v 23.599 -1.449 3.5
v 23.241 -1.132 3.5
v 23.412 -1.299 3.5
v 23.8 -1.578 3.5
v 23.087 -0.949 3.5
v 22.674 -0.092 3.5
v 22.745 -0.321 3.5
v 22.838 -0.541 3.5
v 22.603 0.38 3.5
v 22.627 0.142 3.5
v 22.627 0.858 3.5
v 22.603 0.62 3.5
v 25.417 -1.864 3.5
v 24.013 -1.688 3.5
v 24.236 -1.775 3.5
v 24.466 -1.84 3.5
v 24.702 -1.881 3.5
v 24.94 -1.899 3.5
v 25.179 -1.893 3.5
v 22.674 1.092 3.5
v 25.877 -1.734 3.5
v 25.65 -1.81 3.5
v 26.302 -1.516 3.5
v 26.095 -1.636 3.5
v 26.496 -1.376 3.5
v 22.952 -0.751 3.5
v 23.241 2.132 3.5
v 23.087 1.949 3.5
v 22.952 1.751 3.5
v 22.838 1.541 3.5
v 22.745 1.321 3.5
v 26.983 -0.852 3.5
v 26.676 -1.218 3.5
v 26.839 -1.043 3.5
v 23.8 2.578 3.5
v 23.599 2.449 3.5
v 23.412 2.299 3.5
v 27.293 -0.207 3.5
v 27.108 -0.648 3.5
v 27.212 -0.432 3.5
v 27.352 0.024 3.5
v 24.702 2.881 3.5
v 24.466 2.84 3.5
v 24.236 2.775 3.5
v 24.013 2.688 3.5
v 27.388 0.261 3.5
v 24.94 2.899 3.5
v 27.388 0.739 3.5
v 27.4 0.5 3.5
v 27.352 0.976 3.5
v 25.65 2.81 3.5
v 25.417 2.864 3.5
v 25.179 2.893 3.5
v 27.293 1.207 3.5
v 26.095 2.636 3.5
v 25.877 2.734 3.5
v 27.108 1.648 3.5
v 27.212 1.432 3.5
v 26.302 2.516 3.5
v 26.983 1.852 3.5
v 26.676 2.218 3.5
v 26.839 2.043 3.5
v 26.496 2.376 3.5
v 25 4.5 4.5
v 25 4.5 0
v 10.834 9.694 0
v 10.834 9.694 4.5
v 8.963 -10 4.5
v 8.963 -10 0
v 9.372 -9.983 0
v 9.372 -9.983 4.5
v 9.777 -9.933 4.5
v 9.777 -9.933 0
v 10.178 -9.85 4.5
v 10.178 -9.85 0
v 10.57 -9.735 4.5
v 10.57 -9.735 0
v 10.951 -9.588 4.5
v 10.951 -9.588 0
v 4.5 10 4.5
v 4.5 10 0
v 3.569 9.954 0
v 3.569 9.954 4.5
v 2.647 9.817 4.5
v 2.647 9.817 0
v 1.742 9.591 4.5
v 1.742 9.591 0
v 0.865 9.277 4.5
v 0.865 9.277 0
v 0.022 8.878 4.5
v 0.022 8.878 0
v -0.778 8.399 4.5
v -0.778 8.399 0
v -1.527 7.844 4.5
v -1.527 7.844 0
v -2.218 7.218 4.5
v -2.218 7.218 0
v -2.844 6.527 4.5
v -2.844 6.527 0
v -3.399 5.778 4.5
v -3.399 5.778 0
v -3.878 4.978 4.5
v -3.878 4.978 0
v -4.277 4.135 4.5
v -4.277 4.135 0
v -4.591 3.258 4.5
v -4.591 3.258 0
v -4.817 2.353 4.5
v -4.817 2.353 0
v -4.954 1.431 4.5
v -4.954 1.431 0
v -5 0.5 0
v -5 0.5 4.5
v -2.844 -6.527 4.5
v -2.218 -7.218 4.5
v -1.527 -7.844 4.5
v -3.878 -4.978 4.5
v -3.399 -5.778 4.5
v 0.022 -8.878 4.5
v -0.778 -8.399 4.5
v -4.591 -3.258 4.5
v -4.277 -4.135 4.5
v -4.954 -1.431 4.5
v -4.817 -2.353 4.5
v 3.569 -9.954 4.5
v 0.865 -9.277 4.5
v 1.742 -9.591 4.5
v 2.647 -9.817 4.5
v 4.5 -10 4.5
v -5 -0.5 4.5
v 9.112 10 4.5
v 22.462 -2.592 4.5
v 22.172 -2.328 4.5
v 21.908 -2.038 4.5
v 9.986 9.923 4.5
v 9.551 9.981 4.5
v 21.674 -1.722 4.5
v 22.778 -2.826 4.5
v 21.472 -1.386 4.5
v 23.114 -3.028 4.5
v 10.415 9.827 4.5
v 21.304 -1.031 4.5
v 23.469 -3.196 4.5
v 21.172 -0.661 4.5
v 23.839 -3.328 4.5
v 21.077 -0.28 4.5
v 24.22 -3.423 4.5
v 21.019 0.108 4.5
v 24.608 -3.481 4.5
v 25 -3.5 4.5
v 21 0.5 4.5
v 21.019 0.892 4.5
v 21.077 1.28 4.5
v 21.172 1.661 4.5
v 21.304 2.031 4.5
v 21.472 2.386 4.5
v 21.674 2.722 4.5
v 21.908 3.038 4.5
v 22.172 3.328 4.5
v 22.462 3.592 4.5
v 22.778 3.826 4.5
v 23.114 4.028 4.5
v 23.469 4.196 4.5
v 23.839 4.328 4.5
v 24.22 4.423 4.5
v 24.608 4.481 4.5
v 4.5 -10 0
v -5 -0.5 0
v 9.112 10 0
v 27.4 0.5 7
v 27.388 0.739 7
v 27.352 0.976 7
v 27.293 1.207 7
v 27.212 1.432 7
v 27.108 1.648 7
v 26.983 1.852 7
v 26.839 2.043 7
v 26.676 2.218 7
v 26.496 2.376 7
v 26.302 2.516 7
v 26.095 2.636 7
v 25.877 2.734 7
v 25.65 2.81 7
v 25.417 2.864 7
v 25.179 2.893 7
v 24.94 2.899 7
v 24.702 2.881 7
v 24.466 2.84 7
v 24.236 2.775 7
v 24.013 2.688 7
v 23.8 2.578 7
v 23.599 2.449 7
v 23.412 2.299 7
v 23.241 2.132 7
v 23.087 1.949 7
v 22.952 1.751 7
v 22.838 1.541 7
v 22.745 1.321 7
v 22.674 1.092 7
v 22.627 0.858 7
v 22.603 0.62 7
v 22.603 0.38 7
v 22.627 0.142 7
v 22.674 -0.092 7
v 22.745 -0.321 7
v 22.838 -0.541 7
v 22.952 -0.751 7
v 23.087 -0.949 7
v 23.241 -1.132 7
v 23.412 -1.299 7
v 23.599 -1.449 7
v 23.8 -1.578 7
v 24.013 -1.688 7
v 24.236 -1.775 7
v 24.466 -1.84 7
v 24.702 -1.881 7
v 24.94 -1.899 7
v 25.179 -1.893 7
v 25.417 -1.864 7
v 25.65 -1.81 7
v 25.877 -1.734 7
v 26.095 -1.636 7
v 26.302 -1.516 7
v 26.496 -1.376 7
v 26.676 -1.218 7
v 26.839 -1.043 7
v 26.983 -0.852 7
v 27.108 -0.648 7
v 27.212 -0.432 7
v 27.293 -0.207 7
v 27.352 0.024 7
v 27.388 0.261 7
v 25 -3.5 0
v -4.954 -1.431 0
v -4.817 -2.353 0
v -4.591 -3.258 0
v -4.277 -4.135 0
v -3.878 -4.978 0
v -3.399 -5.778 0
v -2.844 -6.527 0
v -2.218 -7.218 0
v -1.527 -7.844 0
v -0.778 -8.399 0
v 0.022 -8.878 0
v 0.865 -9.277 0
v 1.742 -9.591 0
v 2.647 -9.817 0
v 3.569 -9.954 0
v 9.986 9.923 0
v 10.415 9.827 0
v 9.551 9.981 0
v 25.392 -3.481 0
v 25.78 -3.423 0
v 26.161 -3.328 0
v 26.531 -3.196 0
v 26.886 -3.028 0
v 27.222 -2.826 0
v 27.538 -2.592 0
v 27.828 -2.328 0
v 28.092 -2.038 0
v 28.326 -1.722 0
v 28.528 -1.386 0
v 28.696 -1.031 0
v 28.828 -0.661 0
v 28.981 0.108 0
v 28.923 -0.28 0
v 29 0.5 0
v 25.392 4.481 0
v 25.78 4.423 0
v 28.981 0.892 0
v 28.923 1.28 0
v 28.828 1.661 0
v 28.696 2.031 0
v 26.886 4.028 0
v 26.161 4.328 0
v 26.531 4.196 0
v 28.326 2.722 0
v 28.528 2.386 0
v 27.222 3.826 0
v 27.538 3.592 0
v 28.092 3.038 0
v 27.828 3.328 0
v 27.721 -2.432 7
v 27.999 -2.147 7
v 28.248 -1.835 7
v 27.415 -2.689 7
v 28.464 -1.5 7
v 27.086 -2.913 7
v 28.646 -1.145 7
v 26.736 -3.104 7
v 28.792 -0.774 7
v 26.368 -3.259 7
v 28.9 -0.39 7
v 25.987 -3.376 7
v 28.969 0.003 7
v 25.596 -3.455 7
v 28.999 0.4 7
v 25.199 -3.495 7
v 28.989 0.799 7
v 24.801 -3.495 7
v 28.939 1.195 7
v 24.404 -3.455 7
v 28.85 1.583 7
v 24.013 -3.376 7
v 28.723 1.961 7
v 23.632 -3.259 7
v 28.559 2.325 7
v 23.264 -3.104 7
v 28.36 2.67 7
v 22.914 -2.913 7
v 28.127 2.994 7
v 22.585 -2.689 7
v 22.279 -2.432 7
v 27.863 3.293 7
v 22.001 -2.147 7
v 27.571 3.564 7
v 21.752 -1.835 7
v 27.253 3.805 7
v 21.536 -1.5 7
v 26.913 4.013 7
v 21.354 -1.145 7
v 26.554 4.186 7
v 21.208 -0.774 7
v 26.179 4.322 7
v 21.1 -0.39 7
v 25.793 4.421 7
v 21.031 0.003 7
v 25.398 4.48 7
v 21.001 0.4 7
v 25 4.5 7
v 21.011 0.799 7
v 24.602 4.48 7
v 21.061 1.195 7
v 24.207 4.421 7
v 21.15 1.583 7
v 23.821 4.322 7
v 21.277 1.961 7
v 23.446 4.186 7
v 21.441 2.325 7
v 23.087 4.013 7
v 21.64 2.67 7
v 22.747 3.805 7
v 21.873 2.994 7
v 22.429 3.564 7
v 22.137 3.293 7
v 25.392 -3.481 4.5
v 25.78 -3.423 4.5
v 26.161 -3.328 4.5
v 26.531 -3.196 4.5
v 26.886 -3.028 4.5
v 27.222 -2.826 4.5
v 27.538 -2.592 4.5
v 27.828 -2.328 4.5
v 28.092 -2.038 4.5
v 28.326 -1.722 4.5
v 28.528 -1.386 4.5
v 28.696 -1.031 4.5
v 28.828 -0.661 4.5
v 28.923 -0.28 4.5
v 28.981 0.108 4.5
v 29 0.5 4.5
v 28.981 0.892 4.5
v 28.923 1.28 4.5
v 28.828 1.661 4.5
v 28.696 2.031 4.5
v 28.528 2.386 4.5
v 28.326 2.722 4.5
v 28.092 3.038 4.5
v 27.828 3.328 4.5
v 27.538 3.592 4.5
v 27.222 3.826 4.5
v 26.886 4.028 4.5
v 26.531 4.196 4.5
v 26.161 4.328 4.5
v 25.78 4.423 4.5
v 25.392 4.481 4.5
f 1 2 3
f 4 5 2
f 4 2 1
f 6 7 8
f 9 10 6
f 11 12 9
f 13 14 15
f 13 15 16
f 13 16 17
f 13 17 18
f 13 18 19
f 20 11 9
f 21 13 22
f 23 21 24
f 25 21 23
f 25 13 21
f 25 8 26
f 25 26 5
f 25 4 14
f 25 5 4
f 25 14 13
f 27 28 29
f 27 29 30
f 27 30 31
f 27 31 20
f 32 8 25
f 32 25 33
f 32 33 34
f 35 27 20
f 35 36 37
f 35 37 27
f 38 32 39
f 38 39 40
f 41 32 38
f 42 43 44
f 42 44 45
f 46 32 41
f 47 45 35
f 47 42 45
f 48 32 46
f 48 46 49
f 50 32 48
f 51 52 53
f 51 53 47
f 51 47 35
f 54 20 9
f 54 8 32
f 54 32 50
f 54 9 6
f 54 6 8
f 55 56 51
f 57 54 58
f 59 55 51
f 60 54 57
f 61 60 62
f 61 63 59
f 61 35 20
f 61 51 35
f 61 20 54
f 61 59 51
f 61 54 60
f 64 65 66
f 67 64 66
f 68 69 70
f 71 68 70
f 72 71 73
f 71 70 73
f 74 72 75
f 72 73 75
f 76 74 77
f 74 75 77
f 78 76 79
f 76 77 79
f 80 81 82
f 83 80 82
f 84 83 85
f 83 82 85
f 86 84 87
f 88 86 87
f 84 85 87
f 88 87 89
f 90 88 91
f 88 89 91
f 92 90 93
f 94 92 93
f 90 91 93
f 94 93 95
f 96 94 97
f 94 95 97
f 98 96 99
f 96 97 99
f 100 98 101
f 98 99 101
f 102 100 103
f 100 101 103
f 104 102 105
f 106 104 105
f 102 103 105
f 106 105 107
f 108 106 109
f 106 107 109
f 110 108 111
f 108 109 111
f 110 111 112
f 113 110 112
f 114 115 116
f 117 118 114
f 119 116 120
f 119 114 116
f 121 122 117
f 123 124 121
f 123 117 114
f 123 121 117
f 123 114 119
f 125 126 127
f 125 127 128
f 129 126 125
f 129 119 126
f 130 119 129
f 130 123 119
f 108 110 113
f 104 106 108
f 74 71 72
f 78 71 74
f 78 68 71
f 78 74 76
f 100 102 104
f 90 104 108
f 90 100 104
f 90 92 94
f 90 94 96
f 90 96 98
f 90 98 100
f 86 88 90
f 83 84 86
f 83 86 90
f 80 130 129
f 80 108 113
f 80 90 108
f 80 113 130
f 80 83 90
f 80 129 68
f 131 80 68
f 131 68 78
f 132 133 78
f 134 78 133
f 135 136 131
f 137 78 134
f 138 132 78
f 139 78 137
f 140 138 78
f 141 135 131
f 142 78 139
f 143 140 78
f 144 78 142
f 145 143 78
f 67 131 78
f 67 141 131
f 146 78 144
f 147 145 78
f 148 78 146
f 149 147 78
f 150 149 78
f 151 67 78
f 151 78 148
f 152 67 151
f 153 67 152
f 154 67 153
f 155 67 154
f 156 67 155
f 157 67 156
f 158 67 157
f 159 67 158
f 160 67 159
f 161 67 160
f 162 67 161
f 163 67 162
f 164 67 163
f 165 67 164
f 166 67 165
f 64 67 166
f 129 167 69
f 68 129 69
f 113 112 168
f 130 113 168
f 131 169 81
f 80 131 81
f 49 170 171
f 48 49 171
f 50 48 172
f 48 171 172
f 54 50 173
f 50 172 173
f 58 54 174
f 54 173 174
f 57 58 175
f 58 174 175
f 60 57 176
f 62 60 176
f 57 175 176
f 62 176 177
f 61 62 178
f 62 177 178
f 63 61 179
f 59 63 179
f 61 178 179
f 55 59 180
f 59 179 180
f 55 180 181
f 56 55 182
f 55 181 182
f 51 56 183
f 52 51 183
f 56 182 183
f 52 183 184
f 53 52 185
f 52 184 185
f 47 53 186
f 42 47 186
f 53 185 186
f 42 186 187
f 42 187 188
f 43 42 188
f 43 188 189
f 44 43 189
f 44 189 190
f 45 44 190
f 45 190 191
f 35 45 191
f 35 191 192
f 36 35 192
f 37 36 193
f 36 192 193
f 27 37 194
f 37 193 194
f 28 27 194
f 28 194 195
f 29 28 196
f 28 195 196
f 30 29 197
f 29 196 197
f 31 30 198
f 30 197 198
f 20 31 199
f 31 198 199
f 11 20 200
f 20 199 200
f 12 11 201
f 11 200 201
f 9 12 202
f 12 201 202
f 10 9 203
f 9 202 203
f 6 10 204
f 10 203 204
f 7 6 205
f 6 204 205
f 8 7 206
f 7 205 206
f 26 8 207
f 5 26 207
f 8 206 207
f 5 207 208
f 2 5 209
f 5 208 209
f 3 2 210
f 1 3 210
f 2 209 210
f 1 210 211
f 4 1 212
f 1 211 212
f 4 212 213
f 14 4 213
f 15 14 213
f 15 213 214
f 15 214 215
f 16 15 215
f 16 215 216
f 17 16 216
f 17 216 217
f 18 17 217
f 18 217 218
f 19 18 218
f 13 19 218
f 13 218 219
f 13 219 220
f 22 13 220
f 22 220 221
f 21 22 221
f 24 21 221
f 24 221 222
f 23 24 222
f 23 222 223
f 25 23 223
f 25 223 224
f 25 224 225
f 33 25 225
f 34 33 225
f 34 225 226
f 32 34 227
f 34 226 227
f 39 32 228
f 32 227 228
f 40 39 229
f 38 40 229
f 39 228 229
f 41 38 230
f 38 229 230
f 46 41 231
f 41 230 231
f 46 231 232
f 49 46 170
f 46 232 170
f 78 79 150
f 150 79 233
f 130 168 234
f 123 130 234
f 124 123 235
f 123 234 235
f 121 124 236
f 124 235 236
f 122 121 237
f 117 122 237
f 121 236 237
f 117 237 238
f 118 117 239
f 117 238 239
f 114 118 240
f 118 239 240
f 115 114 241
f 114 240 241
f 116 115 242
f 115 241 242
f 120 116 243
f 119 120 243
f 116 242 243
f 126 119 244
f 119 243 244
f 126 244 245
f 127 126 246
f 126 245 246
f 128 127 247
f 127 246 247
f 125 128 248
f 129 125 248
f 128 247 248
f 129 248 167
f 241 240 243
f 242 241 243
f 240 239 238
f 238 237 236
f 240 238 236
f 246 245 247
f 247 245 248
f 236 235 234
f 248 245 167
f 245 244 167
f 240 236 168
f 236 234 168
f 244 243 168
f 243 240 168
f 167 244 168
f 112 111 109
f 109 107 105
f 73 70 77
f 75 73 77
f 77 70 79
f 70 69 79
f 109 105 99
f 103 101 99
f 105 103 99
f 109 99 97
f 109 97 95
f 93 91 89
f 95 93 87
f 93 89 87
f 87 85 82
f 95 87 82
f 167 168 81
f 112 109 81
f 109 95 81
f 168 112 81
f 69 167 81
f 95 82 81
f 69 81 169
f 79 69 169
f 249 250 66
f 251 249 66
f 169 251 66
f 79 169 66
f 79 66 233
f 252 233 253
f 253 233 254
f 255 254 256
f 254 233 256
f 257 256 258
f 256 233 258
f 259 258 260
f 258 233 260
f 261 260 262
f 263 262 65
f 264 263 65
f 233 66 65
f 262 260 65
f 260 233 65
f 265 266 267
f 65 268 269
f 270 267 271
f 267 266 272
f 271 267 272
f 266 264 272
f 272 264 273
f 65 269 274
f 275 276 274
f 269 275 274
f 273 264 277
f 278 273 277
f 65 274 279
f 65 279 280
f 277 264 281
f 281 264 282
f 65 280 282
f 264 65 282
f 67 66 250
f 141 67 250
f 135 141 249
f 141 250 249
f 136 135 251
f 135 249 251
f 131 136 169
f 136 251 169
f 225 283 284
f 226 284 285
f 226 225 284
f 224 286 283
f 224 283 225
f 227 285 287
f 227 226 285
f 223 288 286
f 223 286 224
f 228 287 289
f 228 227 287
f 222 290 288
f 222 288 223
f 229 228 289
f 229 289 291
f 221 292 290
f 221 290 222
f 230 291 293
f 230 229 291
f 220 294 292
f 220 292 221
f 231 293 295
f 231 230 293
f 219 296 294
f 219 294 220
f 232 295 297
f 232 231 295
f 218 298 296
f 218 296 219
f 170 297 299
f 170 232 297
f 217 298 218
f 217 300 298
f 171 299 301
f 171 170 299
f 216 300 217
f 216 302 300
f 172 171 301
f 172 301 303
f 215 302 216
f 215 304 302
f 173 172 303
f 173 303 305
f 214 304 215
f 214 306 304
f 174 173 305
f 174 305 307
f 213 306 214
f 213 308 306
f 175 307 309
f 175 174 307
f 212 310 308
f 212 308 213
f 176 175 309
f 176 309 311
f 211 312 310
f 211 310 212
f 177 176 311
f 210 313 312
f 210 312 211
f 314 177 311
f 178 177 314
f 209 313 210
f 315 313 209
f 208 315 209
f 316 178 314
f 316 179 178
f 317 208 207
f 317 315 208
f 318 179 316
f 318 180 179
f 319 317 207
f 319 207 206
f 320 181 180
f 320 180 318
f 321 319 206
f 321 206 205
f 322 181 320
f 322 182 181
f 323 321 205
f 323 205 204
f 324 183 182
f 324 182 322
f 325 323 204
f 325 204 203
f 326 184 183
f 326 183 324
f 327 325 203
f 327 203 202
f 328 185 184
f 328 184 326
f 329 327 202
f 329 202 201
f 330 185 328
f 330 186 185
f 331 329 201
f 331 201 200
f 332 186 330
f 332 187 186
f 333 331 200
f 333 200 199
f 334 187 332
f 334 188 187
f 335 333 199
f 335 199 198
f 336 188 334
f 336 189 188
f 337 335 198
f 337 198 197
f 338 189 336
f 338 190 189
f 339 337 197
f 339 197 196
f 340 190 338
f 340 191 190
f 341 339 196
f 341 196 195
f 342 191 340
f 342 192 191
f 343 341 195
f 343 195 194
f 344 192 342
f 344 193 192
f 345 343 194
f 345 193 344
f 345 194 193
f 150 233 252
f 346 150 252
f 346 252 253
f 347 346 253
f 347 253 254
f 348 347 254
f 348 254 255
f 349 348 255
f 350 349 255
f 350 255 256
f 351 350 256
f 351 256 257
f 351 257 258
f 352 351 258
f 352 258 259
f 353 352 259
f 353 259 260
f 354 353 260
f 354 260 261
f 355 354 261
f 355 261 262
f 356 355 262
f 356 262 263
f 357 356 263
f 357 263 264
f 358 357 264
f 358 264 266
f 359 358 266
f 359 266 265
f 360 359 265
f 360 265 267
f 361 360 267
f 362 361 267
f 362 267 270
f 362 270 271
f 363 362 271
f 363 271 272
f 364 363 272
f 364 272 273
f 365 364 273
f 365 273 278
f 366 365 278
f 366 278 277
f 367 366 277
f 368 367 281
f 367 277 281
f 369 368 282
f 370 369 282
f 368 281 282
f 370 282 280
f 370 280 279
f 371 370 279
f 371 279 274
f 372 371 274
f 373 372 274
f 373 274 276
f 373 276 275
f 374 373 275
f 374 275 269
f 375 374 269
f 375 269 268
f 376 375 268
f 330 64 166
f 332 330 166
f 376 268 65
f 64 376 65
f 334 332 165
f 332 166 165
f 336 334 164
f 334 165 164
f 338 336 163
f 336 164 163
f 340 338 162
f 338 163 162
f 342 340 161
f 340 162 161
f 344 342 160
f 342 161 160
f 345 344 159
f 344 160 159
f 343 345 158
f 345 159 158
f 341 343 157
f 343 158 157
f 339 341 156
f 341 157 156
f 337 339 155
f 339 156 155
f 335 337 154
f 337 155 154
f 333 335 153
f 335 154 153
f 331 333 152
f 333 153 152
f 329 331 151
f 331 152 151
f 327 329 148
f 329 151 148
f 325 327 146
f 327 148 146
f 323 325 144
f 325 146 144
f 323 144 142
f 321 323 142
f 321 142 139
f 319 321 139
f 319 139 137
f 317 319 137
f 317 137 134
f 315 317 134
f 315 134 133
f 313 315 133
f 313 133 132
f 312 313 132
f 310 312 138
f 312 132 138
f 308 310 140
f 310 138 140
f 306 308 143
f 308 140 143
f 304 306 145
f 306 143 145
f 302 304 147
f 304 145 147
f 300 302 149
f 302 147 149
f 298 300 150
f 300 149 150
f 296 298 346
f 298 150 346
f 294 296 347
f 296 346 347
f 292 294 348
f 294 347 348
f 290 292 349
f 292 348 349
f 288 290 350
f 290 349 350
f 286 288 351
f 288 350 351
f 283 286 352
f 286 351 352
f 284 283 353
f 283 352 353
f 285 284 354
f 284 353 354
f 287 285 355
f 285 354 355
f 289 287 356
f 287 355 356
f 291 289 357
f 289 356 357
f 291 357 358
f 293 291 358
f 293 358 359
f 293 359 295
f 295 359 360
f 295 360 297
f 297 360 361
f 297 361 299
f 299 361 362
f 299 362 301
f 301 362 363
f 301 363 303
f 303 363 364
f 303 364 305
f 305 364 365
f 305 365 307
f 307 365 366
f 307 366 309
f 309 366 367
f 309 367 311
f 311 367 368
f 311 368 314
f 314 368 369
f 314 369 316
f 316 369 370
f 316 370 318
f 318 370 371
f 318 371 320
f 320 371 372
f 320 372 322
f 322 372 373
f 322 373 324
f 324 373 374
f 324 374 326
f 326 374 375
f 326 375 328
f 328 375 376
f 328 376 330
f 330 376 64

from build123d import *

# Parameters (mm, degrees)
RESSALTO_EXTRUS_O1_DEPTH = 4.5
ESBO_O3_R                = 4
RESSALTO_EXTRUS_O2_DEPTH = 2.5
ESBO_O5_R                = 2.4
CORTE_EXTRUS_O1_DEPTH    = 3.5


with BuildPart() as part:
    # Esboço1 → Ressalto-extrusão1 (new body)
    with BuildSketch(Plane.XY):
        with BuildLine():
            ThreePointArc((-5, -0.5), (-2.217514421, -7.217514421), (4.5, -10))
            Line((4.5, -10), (8.963244058, -10))
            ThreePointArc((8.963244058, -10), (9.978406451, -9.895860018), (10.951281246, -9.587778127))
            Line((10.951281246, -9.587778127), (25, -3.5))
            ThreePointArc((25, -3.5), (29, 0.5), (25, 4.5))
            Line((25, 4.5), (10.833504783, 9.694381579))
            ThreePointArc((10.833504783, 9.694381579), (9.986328816, 9.923002534), (9.112231538, 10))
            Line((9.112231538, 10), (4.5, 10))
            ThreePointArc((4.5, 10), (-2.217514421, 7.217514421), (-5, 0.5))
            Line((-5, 0.5), (-5, -0.5))
        make_face()
    extrude(amount=RESSALTO_EXTRUS_O1_DEPTH)

    # Esboço3 → Ressalto-extrusão2 (add)
    with BuildSketch(Plane.XY.offset(4.5)):
        with Locations((25, 0.5)):
            Circle(ESBO_O3_R)
    extrude(amount=RESSALTO_EXTRUS_O2_DEPTH)

    # Esboço5 → Corte-extrusão1 (cut)
    with BuildSketch(Plane.XY.offset(7)):
        with Locations((25, 0.5)):
            Circle(ESBO_O5_R)
    extrude(amount=-CORTE_EXTRUS_O1_DEPTH, mode=Mode.SUBTRACT)


solid = part.part
